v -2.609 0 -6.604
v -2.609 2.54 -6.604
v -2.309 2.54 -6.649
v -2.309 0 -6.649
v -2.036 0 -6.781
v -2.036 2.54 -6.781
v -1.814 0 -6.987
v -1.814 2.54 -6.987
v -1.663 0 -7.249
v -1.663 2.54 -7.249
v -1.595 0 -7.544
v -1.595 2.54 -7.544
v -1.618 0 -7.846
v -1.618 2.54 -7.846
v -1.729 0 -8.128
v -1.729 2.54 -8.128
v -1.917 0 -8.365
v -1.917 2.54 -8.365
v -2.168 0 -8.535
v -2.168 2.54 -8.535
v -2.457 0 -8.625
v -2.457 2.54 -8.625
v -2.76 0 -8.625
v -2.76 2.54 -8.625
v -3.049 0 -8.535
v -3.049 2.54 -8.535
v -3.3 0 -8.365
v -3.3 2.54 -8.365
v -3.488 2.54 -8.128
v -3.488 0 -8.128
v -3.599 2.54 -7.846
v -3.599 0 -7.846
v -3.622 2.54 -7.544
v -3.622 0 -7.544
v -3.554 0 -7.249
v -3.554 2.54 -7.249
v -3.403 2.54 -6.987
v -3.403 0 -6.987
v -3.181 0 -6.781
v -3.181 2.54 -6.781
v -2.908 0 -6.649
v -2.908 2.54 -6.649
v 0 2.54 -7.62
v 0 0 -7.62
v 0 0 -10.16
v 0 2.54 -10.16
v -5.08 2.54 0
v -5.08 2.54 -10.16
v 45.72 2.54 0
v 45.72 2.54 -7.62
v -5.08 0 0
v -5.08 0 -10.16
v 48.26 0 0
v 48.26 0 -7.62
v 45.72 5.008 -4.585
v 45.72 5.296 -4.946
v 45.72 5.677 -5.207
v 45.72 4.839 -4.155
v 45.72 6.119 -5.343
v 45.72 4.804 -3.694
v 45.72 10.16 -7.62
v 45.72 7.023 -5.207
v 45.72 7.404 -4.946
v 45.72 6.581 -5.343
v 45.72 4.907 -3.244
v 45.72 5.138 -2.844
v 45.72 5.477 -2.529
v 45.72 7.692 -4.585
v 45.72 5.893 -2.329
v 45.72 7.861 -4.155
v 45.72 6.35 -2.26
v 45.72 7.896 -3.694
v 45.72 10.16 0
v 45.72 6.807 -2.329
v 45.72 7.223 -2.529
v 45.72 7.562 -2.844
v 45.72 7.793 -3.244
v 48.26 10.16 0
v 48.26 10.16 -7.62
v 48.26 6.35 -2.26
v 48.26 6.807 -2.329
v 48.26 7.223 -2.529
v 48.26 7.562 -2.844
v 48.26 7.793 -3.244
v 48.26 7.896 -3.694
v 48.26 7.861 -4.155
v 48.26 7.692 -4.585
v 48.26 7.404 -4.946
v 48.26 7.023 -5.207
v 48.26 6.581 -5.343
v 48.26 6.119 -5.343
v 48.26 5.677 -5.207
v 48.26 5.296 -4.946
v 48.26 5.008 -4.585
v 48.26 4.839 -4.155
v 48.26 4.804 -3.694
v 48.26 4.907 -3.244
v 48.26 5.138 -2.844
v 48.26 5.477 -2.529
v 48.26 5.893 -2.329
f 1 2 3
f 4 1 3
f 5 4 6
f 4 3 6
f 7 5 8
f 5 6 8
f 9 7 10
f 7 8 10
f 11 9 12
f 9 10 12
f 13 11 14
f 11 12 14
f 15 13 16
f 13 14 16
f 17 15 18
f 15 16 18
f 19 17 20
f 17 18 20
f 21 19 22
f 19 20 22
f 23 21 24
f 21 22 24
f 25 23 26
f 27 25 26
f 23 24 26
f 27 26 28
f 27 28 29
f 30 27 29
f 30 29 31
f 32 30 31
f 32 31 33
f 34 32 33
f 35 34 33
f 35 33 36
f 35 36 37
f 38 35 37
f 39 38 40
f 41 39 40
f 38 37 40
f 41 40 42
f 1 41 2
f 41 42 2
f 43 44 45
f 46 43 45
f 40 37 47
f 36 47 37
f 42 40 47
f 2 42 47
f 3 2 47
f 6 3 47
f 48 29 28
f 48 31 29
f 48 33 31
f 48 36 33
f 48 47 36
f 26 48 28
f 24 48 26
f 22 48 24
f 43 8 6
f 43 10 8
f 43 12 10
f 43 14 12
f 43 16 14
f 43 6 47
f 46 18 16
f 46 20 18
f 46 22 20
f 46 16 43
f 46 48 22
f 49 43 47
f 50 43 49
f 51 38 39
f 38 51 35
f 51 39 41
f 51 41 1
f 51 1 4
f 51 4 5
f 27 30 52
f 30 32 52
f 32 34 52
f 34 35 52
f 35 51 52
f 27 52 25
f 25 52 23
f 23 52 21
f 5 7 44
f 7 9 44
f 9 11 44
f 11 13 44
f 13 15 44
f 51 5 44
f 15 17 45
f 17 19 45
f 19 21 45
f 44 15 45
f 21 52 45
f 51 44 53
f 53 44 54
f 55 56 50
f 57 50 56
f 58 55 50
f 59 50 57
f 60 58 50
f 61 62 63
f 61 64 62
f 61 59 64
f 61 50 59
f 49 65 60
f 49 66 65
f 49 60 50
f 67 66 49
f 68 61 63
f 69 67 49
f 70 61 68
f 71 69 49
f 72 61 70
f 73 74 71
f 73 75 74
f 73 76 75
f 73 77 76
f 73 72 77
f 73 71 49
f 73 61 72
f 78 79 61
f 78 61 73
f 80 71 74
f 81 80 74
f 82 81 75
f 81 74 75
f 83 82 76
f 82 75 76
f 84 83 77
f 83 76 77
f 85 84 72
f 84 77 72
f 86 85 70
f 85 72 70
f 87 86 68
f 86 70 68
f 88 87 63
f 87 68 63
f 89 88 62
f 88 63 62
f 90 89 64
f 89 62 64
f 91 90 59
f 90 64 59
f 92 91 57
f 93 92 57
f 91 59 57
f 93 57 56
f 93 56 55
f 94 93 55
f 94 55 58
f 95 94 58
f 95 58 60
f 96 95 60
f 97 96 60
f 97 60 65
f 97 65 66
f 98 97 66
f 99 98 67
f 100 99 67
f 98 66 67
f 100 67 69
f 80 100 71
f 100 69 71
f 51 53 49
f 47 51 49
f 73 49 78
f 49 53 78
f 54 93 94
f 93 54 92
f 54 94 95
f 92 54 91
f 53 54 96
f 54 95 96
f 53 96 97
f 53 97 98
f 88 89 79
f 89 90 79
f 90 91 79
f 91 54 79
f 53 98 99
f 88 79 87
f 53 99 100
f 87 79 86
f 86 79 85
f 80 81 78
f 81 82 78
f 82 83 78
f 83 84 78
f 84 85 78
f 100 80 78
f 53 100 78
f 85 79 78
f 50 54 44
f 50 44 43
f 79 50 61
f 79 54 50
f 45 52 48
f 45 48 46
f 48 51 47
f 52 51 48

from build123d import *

# Parameters (mm, degrees)
SKETCH2_W           = 48.26
SKETCH2_H           = 7.62
BOSS_EXTRUDE1_DEPTH = 2.54
SKETCH3_W           = 5.08
SKETCH3_H           = 10.16
BOSS_EXTRUDE2_DEPTH = 2.54
SKETCH4_R           = 1.016
CUT_EXTRUDE1_DEPTH  = 2.54
SKETCH5_W           = 7.62
SKETCH5_H           = 7.62
BOSS_EXTRUDE3_DEPTH = 2.54
SKETCH7_R           = 1.55
CUT_EXTRUDE2_DEPTH  = 2.54


with BuildPart() as part:
    # Sketch2 → Boss-Extrude1 (new body)
    with BuildSketch(Plane(origin=(0, 0, 0), x_dir=(1, 0, 0), z_dir=(0, 1, 0))):
        with Locations((24.13, 3.81)):
            Rectangle(SKETCH2_W, SKETCH2_H)
    extrude(amount=BOSS_EXTRUDE1_DEPTH)

    # Sketch3 → Boss-Extrude2 (add)
    with BuildSketch(Plane(origin=(0, 0, 0), x_dir=(1, 0, 0), z_dir=(0, 1, 0))):
        with Locations((-2.54, 5.08)):
            Rectangle(SKETCH3_W, SKETCH3_H)
    extrude(amount=BOSS_EXTRUDE2_DEPTH)

    # Sketch4 → Cut-Extrude1 (cut)
    with BuildSketch(Plane(origin=(0, 2.54, 0), x_dir=(1, 0, 0), z_dir=(0, 1, 0))):
        with Locations(Location((-2.608533825, 7.62, 0), (0, 0, 270))):
            Circle(SKETCH4_R)
    extrude(amount=-CUT_EXTRUDE1_DEPTH, mode=Mode.SUBTRACT)

    # Sketch5 → Boss-Extrude3 (add)
    with BuildSketch(Plane.ZY.offset(-48.26)):
        with Locations((-3.81, 6.35)):
            Rectangle(SKETCH5_W, SKETCH5_H)
    extrude(amount=BOSS_EXTRUDE3_DEPTH)

    # Sketch7 → Cut-Extrude2 (cut)
    with BuildSketch(Plane.ZY.offset(-45.72)):
        with Locations((-3.81, 6.35)):
            Circle(SKETCH7_R)
    extrude(amount=-CUT_EXTRUDE2_DEPTH, mode=Mode.SUBTRACT)


solid = part.part
